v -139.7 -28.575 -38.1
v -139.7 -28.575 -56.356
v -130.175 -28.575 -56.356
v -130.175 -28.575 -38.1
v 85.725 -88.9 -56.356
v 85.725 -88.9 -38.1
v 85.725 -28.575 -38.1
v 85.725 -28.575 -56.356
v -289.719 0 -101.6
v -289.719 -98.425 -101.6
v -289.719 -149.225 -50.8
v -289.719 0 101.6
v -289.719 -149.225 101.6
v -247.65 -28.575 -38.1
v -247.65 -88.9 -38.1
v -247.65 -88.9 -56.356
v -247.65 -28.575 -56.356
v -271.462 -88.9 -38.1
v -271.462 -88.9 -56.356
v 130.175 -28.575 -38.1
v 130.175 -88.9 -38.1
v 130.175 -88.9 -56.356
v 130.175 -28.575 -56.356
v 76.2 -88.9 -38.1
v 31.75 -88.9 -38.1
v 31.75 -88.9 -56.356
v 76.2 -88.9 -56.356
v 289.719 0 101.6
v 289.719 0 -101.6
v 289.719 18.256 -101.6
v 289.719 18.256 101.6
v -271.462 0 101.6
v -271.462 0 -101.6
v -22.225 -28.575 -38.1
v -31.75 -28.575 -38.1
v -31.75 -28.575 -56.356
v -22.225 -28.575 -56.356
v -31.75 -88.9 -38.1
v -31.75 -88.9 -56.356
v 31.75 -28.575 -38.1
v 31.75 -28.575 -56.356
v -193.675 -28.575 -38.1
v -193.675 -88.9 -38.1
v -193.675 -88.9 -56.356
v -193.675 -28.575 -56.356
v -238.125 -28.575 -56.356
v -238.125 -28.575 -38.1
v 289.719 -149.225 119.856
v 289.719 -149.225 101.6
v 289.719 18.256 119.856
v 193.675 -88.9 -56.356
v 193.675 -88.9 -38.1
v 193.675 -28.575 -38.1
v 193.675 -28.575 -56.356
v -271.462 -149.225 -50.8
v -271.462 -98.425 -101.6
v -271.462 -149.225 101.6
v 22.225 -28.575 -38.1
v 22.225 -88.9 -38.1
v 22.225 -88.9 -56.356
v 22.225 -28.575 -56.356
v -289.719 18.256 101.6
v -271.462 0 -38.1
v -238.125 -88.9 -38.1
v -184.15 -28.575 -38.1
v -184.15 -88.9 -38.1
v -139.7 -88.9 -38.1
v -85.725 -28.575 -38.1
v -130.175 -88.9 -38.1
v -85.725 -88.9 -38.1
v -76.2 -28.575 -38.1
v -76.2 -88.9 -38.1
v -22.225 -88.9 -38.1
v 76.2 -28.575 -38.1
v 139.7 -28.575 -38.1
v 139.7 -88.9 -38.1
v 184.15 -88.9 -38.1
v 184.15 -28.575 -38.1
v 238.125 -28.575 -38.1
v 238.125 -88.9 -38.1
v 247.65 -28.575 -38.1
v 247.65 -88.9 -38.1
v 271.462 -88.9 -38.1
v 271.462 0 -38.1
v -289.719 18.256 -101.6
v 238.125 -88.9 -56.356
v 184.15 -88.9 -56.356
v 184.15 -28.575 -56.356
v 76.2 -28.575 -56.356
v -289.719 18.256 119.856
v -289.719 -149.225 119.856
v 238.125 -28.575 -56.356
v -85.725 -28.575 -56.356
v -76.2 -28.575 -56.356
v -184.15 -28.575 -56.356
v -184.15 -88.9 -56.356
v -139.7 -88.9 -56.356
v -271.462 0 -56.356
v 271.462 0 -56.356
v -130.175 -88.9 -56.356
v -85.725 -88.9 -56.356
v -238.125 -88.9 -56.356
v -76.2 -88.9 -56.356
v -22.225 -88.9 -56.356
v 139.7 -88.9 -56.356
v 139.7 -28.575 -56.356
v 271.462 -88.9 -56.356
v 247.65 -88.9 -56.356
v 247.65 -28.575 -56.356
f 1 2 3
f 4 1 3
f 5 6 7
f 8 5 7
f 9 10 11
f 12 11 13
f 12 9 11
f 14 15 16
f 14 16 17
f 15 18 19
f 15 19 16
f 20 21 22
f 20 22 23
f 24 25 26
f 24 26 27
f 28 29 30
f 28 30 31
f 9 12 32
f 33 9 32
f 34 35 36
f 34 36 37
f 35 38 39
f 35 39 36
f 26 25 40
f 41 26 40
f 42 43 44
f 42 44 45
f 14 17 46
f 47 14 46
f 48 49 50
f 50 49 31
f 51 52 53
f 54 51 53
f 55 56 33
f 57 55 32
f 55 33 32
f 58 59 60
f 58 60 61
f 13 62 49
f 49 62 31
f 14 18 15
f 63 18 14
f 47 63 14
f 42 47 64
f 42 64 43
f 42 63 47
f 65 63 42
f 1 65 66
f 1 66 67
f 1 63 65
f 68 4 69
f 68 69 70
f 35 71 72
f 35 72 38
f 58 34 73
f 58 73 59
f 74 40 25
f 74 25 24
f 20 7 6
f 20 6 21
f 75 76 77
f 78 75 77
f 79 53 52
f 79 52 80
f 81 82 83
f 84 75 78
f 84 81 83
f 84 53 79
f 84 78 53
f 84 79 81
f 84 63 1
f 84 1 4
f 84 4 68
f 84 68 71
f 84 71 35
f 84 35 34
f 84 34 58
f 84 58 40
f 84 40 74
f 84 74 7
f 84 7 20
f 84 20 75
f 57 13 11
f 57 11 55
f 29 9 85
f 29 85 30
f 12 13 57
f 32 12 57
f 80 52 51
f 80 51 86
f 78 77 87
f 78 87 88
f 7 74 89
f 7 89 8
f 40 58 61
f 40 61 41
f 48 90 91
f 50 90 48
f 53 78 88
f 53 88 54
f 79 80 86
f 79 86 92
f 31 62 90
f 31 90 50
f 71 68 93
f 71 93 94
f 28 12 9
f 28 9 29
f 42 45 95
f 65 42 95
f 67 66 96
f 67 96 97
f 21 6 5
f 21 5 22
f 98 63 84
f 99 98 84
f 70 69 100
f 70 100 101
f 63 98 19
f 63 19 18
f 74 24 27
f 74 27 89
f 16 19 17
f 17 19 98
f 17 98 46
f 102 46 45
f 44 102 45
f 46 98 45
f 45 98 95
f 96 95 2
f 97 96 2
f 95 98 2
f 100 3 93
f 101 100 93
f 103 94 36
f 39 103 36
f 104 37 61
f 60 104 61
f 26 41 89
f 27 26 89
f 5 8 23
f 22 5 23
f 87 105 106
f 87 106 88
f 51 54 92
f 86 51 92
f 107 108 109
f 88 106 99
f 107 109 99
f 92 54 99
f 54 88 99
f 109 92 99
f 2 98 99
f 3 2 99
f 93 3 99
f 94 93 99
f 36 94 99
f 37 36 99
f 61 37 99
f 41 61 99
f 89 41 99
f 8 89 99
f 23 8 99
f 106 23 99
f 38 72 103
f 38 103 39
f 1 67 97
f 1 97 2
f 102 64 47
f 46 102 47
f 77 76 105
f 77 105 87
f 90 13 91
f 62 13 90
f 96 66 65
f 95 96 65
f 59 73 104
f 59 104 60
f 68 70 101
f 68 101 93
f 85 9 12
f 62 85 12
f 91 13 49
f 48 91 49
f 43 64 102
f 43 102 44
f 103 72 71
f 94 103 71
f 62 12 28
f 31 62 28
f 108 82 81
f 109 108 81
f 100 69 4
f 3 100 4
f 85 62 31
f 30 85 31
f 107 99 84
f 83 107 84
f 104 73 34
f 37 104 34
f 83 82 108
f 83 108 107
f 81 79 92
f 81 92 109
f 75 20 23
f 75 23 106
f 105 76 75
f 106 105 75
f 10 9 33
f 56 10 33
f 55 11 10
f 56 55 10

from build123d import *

# Parameters (mm, degrees)
F0_W      = 579.4375
F0_H      = 203.2
F1_DEPTH  = 18.25625
F2_W      = 18.25625
F2_H      = 203.2
F3_DEPTH  = 149.225
F4_W      = 579.4375
F4_H      = 167.48125
F5_DEPTH  = 18.25625
F6_W      = 542.925
F6_H      = 18.25625
F7_DEPTH  = 88.9
F8_W      = 9.525
F8_H      = 60.325
F9_DEPTH  = 63.501
F11_DEPTH = 25.4


with BuildPart() as f1:
    # F0 (on Front) → F1 (new body)
    with BuildSketch(Plane.XZ):
        Rectangle(F0_W, F0_H)
    extrude(amount=-F1_DEPTH)


with BuildPart() as f3:
    # F2 (on face) → F3 (new body)
    with BuildSketch(Plane.XZ):
        with Locations((-280.590625, 0)):
            Rectangle(F2_W, F2_H)
    extrude(amount=F3_DEPTH)

    # F10 (on face) → F11 (cut)
    with BuildSketch(Plane(origin=(-289.71875, 0, 0), x_dir=(0, -1, 0), z_dir=(-1, 0, 0))):
        Polygon((149.225, -101.6), (149.225, -50.8), (98.425, -101.6), align=None)
    extrude(amount=-F11_DEPTH, mode=Mode.SUBTRACT)


with BuildPart() as f5:
    # F4 (on face) → F5 (new body)
    with BuildSketch(Plane.XY.offset(101.6)):
        with Locations((0, -65.484375)):
            Rectangle(F4_W, F4_H)
    extrude(amount=F5_DEPTH)


with BuildPart() as f7:
    # F6 (on face) → F7 (new body)
    with BuildSketch(Plane.XZ):
        with Locations((0, -47.228125)):
            Rectangle(F6_W, F6_H)
    extrude(amount=F7_DEPTH)

    # F8 (on face) → F9 (cut, through all)
    with BuildSketch(Plane.XY.offset(-38.1)):
        with Locations((-242.8875, -58.7375)):
            Rectangle(F8_W, F8_H)
        with Locations((-188.9125, -58.7375)):
            Rectangle(F8_W, F8_H)
        with Locations((-134.9375, -58.7375)):
            Rectangle(F8_W, F8_H)
        with Locations((-80.9625, -58.7375)):
            Rectangle(F8_W, F8_H)
        with Locations((-26.9875, -58.7375)):
            Rectangle(F8_W, F8_H)
        with Locations((26.9875, -58.7375)):
            Rectangle(F8_W, F8_H)
        with Locations((80.9625, -58.7375)):
            Rectangle(F8_W, F8_H)
        with Locations((134.9375, -58.7375)):
            Rectangle(F8_W, F8_H)
        with Locations((188.9125, -58.7375)):
            Rectangle(F8_W, F8_H)
        with Locations((242.8875, -58.7375)):
            Rectangle(F8_W, F8_H)
    extrude(amount=-F9_DEPTH, mode=Mode.SUBTRACT)


solid = Compound([f1.part, f3.part, f5.part, f7.part])
